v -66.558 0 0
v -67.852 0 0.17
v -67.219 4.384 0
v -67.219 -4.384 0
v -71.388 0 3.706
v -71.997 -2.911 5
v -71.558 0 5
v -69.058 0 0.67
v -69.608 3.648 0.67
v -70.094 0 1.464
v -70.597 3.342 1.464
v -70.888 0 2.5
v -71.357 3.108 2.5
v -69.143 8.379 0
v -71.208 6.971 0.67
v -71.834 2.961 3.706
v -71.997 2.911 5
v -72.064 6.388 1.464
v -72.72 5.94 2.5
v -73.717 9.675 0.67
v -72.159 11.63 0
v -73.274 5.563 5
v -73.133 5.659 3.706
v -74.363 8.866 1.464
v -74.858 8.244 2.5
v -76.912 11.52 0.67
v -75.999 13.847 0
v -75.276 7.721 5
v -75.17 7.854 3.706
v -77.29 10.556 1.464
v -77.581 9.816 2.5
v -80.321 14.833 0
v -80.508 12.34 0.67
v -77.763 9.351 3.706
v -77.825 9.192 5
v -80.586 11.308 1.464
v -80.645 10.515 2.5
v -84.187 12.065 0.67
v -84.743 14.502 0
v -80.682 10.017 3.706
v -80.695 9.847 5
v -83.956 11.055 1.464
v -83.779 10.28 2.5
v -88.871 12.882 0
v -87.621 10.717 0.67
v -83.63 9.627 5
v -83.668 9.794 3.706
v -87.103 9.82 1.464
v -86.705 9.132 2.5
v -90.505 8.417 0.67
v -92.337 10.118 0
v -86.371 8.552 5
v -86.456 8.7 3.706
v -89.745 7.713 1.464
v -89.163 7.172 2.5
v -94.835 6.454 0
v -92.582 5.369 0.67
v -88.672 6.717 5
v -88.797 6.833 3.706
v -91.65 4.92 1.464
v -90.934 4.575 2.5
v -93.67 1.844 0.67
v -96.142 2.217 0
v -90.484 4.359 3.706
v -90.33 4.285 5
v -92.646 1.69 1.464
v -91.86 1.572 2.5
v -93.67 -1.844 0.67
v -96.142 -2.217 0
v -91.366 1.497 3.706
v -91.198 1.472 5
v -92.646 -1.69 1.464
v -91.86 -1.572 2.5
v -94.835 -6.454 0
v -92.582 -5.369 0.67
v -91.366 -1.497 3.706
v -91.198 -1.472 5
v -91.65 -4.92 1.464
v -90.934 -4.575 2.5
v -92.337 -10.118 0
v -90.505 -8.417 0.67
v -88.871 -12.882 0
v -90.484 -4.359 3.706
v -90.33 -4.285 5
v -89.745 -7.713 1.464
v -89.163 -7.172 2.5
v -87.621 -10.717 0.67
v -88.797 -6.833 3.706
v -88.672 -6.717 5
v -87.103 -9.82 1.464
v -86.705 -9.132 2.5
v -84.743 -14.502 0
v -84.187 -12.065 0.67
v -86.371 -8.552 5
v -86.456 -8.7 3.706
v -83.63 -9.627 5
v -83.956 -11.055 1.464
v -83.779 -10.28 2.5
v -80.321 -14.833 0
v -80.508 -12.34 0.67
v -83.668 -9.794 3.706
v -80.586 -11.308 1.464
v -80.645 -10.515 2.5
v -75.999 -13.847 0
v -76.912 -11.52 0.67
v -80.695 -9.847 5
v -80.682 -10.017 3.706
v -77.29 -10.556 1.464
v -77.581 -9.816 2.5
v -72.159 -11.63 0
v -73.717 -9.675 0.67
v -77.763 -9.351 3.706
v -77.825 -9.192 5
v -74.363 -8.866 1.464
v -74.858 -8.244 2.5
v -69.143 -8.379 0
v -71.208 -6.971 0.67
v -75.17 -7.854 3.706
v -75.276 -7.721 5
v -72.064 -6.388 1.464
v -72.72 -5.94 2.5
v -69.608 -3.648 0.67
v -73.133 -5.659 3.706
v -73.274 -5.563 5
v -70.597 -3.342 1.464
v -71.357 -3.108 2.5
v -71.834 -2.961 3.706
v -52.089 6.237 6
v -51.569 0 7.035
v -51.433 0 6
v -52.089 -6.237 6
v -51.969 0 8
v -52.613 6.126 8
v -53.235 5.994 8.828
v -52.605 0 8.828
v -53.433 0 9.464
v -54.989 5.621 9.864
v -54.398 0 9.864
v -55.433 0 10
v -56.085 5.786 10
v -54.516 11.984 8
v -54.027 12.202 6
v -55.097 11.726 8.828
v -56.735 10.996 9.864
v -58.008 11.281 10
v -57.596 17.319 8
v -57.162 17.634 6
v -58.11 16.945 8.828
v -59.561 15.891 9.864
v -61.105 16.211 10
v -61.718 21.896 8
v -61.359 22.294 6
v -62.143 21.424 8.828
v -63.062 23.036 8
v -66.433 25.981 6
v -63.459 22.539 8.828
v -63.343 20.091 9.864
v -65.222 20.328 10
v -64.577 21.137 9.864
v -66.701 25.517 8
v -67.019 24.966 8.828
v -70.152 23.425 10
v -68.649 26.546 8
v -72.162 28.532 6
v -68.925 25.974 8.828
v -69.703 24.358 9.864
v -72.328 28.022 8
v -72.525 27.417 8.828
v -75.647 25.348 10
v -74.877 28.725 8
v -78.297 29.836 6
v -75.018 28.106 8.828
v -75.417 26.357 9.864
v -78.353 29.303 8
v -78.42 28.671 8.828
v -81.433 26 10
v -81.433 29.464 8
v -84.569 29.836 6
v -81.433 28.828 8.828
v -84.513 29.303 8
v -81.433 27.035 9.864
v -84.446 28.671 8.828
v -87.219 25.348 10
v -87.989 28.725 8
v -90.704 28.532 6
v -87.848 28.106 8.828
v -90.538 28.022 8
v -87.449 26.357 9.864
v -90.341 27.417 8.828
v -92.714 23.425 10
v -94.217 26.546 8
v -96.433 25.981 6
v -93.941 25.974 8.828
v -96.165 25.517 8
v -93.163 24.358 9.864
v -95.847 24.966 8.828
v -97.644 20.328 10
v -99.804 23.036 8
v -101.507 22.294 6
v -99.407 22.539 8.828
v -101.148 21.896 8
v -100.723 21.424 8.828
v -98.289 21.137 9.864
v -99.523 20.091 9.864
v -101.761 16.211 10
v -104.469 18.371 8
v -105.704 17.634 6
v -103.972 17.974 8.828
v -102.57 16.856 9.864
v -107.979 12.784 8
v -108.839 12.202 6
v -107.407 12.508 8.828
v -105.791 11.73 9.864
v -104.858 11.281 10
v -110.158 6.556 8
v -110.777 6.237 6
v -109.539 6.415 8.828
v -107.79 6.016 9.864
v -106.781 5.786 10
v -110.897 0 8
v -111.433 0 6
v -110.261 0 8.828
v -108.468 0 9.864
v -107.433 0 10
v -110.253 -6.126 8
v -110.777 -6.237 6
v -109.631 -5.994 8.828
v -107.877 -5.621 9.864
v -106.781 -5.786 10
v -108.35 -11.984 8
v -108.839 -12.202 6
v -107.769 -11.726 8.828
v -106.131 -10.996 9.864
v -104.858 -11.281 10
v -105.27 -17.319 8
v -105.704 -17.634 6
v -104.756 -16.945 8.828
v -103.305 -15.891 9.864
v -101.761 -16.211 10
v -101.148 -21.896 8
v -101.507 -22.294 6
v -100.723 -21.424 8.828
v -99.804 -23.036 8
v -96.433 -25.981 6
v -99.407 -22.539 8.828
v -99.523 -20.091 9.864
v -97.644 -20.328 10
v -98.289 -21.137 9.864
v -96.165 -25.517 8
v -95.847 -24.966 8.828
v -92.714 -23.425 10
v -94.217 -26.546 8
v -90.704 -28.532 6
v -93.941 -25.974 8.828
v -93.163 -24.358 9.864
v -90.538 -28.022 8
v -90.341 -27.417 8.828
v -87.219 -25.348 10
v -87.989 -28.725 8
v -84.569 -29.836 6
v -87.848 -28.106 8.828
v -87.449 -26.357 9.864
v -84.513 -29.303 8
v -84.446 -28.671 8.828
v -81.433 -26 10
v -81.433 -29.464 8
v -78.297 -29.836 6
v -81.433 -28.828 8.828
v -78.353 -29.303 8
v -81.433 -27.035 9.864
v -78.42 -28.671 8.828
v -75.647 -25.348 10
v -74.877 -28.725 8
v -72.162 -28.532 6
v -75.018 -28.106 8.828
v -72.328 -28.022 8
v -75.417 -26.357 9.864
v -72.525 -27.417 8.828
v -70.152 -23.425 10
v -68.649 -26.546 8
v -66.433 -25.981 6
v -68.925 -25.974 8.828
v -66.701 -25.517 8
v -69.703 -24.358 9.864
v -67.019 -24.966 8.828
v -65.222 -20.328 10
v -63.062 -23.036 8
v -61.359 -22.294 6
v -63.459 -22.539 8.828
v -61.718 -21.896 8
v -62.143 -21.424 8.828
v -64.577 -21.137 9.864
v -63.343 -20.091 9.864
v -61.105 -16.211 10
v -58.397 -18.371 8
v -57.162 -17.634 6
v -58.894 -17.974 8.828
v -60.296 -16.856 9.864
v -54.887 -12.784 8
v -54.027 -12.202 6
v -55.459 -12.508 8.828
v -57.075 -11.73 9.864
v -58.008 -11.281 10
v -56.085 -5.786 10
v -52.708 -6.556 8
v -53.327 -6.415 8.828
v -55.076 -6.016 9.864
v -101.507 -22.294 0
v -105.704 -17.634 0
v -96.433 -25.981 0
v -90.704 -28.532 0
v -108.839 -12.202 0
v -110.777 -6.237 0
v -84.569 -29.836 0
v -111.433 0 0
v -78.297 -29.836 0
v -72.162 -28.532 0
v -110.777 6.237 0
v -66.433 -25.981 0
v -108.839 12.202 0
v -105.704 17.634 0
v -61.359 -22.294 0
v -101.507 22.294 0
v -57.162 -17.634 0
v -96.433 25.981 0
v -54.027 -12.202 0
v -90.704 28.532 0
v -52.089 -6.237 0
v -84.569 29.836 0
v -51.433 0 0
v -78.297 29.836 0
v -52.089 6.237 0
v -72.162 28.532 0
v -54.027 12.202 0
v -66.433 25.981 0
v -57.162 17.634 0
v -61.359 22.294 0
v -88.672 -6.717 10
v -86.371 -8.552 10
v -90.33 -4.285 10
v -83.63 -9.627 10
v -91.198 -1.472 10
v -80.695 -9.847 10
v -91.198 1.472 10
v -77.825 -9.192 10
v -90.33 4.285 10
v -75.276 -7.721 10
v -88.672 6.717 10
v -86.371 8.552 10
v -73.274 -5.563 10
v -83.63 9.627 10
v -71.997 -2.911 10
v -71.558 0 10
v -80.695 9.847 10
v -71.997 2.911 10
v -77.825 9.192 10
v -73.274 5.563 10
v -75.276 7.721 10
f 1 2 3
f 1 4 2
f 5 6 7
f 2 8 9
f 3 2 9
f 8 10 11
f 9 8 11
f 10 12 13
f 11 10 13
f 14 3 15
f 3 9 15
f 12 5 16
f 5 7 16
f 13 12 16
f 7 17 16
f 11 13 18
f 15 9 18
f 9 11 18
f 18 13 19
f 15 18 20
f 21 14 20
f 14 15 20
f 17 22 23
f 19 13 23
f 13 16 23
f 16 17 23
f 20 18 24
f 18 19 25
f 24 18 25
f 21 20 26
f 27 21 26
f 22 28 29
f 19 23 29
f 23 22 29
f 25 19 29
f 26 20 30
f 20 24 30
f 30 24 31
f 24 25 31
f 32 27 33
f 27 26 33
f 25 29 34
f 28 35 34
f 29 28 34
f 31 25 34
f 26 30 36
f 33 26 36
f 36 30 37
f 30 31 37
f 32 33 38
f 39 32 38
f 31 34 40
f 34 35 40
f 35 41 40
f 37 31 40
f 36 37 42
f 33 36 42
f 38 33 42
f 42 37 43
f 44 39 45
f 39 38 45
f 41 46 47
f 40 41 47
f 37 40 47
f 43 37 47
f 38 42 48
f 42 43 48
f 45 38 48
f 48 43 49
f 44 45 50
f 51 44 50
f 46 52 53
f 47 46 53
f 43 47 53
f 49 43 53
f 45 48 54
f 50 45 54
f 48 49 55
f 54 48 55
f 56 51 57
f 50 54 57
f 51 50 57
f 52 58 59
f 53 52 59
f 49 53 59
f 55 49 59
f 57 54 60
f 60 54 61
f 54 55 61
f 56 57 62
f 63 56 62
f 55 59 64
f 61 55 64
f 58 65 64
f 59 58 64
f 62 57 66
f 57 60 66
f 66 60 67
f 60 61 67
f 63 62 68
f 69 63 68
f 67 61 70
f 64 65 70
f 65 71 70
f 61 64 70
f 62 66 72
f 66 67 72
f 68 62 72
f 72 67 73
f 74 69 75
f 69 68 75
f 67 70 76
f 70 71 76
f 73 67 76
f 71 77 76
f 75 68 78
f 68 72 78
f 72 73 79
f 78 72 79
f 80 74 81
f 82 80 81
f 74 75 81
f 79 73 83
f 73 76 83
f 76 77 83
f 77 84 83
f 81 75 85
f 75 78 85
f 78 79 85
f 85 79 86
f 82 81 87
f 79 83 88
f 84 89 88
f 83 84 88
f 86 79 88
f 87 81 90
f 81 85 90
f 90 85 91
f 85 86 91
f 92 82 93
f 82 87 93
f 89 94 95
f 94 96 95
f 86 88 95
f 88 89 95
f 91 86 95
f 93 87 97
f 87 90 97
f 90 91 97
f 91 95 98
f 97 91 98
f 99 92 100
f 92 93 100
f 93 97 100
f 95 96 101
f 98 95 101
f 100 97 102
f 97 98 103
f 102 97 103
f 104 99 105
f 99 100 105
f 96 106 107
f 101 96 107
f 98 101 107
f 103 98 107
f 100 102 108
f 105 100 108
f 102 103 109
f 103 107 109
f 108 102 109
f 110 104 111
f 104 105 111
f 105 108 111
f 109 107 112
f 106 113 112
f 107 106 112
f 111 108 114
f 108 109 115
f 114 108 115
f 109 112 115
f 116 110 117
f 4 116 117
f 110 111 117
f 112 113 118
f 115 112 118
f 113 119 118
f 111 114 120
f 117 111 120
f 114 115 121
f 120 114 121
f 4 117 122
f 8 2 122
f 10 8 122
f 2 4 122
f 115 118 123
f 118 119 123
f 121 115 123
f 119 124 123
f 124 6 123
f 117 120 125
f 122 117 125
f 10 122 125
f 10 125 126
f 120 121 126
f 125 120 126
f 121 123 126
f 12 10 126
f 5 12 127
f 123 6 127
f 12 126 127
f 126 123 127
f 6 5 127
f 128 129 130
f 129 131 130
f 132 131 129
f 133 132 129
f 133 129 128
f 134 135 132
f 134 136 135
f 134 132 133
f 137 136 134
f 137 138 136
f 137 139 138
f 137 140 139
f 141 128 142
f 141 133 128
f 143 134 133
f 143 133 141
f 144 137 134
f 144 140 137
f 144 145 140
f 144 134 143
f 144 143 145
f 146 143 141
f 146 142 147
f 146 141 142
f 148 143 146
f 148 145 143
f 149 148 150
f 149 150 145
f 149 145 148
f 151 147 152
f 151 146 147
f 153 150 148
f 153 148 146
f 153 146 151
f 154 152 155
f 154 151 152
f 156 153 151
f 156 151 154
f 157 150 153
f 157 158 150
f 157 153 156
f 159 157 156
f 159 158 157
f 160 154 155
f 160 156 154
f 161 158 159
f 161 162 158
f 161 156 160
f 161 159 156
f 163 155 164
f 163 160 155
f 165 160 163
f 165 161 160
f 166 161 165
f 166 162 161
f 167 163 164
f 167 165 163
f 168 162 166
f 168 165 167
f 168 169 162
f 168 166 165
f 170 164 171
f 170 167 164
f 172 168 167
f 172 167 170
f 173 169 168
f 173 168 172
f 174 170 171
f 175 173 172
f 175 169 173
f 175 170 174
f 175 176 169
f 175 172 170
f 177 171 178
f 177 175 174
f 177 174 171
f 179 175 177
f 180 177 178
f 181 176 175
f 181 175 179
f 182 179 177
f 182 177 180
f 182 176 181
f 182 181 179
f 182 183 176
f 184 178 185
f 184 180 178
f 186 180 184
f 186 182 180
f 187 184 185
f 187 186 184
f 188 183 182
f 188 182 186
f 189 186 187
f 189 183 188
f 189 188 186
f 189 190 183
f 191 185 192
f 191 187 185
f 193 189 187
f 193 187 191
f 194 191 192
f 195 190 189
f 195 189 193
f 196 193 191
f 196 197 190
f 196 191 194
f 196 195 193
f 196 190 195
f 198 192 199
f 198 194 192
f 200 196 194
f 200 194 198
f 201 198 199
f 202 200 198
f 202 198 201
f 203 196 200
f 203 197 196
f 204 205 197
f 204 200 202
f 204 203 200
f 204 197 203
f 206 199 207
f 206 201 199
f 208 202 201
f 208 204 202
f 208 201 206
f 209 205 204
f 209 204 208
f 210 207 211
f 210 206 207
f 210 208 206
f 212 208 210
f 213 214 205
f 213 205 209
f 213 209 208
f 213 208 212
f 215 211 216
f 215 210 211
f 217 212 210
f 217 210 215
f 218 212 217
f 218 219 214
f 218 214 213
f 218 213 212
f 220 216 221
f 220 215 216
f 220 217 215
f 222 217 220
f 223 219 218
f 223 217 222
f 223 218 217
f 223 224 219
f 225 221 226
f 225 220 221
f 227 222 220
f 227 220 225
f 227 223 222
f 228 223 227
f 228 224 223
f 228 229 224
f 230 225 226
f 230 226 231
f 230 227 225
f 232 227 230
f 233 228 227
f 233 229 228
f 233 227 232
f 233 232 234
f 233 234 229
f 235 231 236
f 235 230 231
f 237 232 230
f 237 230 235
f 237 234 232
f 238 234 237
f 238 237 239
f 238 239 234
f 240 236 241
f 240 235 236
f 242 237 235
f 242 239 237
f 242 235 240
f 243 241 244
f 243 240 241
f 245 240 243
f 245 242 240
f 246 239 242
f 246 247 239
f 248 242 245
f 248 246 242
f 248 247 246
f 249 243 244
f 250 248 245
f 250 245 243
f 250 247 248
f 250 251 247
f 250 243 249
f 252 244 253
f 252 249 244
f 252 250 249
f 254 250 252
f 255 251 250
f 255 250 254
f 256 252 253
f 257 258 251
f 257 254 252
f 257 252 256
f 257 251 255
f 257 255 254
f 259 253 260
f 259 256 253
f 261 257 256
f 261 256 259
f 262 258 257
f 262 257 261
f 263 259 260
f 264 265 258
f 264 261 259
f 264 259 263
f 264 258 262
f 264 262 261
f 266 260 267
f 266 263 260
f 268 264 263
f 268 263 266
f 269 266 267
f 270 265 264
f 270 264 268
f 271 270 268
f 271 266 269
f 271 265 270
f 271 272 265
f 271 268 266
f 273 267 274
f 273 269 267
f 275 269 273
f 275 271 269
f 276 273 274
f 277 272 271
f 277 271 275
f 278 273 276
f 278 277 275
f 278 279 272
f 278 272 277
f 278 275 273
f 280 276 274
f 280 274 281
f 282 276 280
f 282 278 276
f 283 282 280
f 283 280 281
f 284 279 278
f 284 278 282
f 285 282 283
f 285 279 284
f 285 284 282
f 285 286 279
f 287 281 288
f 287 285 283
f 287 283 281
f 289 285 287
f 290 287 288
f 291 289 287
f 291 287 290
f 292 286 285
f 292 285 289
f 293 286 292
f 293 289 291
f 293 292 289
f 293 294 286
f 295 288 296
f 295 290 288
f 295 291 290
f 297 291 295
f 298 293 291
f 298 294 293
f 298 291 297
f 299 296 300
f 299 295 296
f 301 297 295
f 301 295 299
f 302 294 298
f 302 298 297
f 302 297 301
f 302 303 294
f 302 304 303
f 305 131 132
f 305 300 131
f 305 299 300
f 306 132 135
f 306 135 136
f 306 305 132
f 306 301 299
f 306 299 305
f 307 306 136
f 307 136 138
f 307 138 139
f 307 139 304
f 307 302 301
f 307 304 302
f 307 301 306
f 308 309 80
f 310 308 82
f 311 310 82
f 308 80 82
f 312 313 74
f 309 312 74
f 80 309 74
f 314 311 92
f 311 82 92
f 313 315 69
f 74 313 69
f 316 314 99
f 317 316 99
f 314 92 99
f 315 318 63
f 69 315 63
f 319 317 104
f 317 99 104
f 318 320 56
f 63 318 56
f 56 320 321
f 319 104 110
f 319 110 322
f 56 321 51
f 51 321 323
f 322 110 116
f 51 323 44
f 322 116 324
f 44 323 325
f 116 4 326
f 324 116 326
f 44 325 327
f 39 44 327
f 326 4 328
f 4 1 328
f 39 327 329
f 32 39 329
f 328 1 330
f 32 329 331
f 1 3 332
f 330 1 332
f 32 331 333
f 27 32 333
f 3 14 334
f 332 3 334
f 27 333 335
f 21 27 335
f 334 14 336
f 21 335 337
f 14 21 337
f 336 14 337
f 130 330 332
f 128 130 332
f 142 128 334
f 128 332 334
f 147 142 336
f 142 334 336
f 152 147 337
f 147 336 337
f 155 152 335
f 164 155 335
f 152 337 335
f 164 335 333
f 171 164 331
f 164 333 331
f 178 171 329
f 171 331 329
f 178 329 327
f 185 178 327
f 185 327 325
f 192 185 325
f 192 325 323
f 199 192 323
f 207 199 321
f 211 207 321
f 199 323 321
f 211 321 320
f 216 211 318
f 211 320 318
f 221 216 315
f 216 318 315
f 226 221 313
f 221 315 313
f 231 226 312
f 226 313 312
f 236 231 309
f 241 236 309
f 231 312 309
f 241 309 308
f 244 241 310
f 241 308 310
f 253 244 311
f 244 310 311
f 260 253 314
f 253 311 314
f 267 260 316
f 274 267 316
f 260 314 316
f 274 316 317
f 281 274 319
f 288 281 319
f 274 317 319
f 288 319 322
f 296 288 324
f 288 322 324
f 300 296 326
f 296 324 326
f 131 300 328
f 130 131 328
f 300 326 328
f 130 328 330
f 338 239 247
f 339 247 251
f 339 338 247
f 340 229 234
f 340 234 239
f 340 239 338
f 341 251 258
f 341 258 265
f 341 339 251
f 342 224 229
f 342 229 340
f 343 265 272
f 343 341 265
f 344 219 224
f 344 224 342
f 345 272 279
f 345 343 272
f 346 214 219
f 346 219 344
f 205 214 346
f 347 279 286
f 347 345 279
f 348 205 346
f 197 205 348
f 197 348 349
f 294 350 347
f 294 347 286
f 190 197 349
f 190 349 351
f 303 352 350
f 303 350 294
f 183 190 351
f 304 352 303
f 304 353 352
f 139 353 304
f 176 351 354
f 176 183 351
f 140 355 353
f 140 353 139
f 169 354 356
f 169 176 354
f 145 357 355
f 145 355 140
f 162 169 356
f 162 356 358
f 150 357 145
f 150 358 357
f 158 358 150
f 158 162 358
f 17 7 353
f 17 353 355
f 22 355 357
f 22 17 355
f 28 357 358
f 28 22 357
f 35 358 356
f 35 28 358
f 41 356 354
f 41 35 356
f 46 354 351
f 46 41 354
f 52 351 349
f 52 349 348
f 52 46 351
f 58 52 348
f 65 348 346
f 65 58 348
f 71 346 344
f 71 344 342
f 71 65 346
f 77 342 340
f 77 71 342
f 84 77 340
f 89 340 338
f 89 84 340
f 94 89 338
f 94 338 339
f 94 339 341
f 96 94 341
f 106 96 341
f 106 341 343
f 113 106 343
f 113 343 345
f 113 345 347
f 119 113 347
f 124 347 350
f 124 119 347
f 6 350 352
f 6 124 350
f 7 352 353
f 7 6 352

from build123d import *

# Parameters (mm, degrees)
SKETCH10_R          = 30
SKETCH10_R_2        = 9.875
BOSS_EXTRUDE4_DEPTH = 10
FILLET1_R           = 4
FILLET2_R           = 5


with BuildPart() as part:
    # Sketch10 → Boss-Extrude4 (new body)
    with BuildSketch(Plane.XY):
        with Locations((-81.433006588, 0)):
            Circle(SKETCH10_R)
        with Locations((-81.433006588, 0)):
            Circle(SKETCH10_R_2, mode=Mode.SUBTRACT)
    extrude(amount=BOSS_EXTRUDE4_DEPTH)

    # Fillet1
    fillet1_edges = [part.edges().sort_by_distance(p)[0] for p in [
        (-111.433006588, 0, 10),
    ]]
    fillet(fillet1_edges, radius=FILLET1_R)

    # Fillet2
    fillet2_edges = [part.edges().sort_by_distance(p)[0] for p in [
        (-91.308006588, 0, 0),
    ]]
    fillet(fillet2_edges, radius=FILLET2_R)


solid = part.part
